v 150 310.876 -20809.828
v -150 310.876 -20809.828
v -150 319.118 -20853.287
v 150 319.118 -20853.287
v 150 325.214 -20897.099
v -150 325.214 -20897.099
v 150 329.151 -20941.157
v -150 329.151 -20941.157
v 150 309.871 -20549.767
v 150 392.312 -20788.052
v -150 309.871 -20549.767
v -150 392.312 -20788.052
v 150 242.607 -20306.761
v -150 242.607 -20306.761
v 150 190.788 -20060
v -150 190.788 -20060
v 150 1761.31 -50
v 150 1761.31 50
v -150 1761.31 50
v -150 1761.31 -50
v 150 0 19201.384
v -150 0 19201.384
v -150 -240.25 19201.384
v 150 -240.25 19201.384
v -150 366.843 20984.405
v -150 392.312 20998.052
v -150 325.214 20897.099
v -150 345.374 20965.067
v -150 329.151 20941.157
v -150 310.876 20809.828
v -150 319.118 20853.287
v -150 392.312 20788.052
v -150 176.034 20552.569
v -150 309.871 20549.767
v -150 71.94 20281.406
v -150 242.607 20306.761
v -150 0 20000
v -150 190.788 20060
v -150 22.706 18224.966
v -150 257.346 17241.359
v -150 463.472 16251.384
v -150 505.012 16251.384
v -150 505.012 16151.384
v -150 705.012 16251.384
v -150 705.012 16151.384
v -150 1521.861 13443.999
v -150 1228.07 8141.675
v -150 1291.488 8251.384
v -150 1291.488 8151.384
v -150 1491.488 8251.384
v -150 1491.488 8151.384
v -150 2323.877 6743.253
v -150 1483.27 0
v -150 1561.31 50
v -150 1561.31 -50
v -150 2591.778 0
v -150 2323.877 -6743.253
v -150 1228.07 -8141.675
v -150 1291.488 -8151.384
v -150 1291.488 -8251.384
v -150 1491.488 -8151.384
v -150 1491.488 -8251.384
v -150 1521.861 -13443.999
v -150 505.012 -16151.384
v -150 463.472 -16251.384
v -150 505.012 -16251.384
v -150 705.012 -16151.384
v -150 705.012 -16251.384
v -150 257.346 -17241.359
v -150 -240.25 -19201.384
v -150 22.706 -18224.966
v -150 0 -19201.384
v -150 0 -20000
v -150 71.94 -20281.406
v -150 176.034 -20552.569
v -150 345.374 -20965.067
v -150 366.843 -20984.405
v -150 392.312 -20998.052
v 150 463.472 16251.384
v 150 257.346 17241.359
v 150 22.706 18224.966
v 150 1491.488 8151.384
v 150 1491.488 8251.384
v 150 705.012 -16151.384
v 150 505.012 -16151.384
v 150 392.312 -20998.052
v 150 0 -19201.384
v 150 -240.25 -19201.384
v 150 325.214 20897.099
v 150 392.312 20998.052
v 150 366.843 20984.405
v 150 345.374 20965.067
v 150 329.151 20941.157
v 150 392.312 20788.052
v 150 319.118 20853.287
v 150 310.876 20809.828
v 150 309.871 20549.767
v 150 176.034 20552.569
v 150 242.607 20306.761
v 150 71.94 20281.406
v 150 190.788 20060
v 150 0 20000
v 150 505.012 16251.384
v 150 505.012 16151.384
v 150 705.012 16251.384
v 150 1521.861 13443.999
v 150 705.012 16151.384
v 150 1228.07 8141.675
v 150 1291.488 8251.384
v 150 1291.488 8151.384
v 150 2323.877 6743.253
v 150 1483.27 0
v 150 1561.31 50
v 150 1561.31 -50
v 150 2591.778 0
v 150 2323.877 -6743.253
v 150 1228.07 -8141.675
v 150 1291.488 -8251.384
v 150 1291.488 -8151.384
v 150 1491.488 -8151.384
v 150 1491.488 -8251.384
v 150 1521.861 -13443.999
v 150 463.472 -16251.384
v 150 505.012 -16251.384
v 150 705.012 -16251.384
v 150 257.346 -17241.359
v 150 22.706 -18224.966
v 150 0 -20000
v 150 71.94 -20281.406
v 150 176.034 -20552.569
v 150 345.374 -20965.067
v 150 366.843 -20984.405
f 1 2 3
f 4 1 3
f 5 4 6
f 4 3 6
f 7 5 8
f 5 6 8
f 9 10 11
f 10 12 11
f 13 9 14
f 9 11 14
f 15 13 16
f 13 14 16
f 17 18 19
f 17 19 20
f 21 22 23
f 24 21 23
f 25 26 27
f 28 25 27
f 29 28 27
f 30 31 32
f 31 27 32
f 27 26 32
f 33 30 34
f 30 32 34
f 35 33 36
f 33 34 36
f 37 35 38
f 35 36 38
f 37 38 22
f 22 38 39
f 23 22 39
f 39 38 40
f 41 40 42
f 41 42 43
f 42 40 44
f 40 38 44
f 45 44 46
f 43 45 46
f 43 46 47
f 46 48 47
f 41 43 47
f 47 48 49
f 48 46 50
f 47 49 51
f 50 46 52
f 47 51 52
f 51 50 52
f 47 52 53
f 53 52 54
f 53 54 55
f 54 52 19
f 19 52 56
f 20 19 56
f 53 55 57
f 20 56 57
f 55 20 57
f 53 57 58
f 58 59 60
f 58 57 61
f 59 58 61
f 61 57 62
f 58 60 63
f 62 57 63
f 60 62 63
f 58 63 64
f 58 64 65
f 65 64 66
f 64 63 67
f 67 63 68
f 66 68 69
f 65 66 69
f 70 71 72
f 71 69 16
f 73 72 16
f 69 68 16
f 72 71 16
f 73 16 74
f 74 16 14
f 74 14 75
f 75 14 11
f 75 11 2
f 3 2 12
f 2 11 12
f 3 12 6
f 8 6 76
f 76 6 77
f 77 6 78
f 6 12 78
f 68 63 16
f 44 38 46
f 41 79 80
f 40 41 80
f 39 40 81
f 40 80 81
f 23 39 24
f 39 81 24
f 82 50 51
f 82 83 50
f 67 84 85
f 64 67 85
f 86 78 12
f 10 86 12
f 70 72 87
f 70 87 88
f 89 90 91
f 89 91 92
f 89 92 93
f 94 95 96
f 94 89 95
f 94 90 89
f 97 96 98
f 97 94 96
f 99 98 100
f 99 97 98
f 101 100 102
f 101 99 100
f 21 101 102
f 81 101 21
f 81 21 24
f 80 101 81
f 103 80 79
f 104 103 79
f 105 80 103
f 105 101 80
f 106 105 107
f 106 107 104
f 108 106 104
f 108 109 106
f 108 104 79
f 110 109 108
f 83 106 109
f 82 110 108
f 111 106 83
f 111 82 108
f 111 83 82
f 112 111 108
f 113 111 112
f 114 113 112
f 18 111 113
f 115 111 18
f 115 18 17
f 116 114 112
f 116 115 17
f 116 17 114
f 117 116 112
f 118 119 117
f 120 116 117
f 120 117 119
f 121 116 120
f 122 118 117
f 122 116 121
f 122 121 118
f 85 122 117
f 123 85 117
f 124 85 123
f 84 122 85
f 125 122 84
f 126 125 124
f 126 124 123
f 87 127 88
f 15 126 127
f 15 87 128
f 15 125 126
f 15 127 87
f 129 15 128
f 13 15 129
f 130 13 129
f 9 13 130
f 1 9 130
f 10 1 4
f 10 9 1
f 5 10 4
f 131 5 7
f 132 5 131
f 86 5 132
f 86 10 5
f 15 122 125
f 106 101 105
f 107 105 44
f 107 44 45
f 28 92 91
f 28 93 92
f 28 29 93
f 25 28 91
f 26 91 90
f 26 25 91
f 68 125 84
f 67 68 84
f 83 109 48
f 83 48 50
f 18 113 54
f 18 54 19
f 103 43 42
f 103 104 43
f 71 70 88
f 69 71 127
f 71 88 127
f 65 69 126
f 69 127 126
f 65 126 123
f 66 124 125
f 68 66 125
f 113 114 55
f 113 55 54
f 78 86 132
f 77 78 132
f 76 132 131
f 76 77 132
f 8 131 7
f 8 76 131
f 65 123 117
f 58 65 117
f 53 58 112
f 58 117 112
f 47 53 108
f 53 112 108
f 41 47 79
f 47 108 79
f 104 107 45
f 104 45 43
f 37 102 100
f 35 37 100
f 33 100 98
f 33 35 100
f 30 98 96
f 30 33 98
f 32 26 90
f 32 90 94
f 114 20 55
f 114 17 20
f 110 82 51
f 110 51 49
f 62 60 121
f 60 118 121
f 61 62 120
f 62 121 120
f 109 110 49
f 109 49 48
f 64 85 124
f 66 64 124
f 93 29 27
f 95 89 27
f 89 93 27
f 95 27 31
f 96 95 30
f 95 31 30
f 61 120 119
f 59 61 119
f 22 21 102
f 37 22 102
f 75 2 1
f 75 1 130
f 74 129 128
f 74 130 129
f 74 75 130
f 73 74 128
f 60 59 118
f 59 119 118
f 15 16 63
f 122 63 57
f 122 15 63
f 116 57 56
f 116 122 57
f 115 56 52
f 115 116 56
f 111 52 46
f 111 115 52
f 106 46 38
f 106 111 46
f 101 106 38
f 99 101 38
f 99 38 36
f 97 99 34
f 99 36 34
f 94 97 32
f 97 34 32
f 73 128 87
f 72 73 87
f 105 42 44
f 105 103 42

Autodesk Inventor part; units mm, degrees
ref_plane "YZ Plane" through (0, 0, 0) normal (1, 0, 0) x (0, 1, 0)
ref_plane "XZ Plane" through (0, 0, 0) normal (0, 1, 0) x (-1, 0, 0)
ref_plane "XY Plane" through (0, 0, 0) normal (0, 0, 1) x (1, 0, 0)
sketch "Sketch1" plane through (0, 0, 0) normal (1, 0, 0) x (0, 1, 0)
  arc A0 (0, -20000) -> (0, 20000) centre (-198997.4874, 0) ccw
  arc A1 (310.8763, 20809.8284) -> (0, 20000) centre (2453.9848, 19522.55) ccw
  arc A2 (310.8763, 20809.8284) -> (329.1509, 20941.157) centre (-568.9757, 20999.1973) ccw
  arc A3 (392.3115, 20998.0517) -> (329.1509, 20941.157) centre (435.8393, 20886.2245) ccw
  line L0 (392.3115, 20998.0517) -> (392.3115, 20788.0517)
  line L1 (392.3115, 20998.0517) -> (602.3115, 20998.0517) construction
  arc A4 (392.3115, 20788.0517) -> (190.7878, 20060) centre (4129.3676, 19361.7237) ccw
  arc A5 (0, -20000) -> (310.8763, -20809.8284) centre (2453.9848, -19522.55) ccw
  arc A6 (329.1509, -20941.157) -> (310.8763, -20809.8284) centre (-568.9757, -20999.1973) ccw
  arc A7 (329.1509, -20941.157) -> (392.3115, -20998.0517) centre (435.8393, -20886.2245) ccw
  line L2 (392.3115, -20998.0517) -> (392.3115, -20788.0517)
  line L3 (392.3115, -20998.0517) -> (602.3115, -20998.0517) construction
  arc A8 (190.7878, -20060) -> (392.3115, -20788.0517) centre (4129.3676, -19361.7237) ccw
  arc A9 (190.7878, -20060) -> (190.7878, 20060) centre (-118120.6503, 0) ccw
  line L4 (190.7878, -20060) -> (0, -20000)
  line L5 (190.7878, 20060) -> (0, 20000)
  point P0 (0, 0)
  point P1 (190, -20060)
  dimension "d0" = 200000
  dimension "d1" = 20000
  dimension "d2" = 20000
  dimension "d3" = 0
  dimension "d4" = 0
  dimension "d5" = 2500
  dimension "d6" = 900
  dimension "d7" = 120
  dimension "d8" = 210
  dimension "d9" = 90
  dimension "d10" = 4000
  dimension "d11" = 200
  dimension "d12" = 60
  dimension "d13" = 120000
extrude "Extrusion1" add sketch "Sketch1" along normal blind 150 and the other way blind 150
sketch "Sketch2" plane through (-150, 392.3115, 20998.0517) normal (0, 1, 0) x (1, 0, 0)
  point P0 (150, 20998.0517)
sketch "Sketch4" plane through (-150, 392.3115, 20998.0517) normal (0, 1, 0) x (1, 0, 0)
  point P0 (150, 20998.0517)
sketch "Sketch5" plane through (-150, 392.3115, 20998.0517) normal (0, 1, 0) x (1, 0, 0)
  point P0 (150, 20998.0517)
sketch "Sketch7" plane through (150, 0, 0) normal (1, 0, 0) x (0, 0, -1)
  arc A0 (-20809.8284, 310.8763) -> (-20000, 0) centre (-19522.55, 2453.9848) ccw projected
  arc A1 (20000, 0) -> (20809.8284, 310.8763) centre (19522.55, 2453.9848) ccw projected
  arc A2 (20000, 0) -> (-20000, 0) centre (0, -198997.4874) ccw projected
  arc A3 (20000, 0) -> (-20000, 0) centre (0, -198997.4874) ccw
  line L0 (20000, 0) -> (-20000, 0)
  point P0 (0, 0)
extrude "Extrusion2" add sketch "Sketch7" against normal blind 300
sketch "Sketch8" plane through (150, 0, 0) normal (1, 0, 0) x (0, 0, -1)
  line L0 (0, 0) -> (0, 300)
  line L1 (0, 300) -> (17500, 300)
  line L2 (0, 300) -> (-17500, 300)
  line L3 (0, 300) -> (17500, 300) construction
  arc A0 (17500, 300) -> (-17500, 300) centre (0, -128516.7303) ccw
  dimension "d22" = 300
  dimension "d23" = 17500
  dimension "d24" = 90
  dimension "d25" = 17500
  dimension "d26" = 180
  dimension "d27" = 130000
extrude "Extrusion3" cut sketch "Sketch8" against normal blind 300
sketch "Sketch9" plane through (150, 0, 0) normal (1, 0, 0) x (0, 0, -1)
  line L0 (17500, 300) -> (-17500, 300) projected
  arc A0 (17500, 300) -> (-17500, 300) centre (0, -128516.7303) ccw projected
  line L1 (-17500, 300) -> (-19201.3845, 0)
  line L2 (-20000, 0) -> (20000, 0) projected
  line L3 (-17500, 300) -> (-15772.3689, 300) construction
  line L4 (17500, 300) -> (19201.3845, 0)
  line L5 (17500, 300) -> (19227.6311, 300) construction
  line L6 (19201.3845, 0) -> (-19201.3845, 0)
  point P0 (0, 0)
  dimension "d30" = 170
  dimension "d31" = 10
extrude "Extrusion4" cut sketch "Sketch9" against normal blind 1000 contours L4 L2 L1 L0
sketch "Sketch10" plane through (150, 0, 0) normal (1, 0, 0) x (0, 0, -1)
  point P0 (0, 0)
sketch "Sketch11" plane through (150, 0, 0) normal (1, 0, 0) x (0, 0, -1)
  line L0 (0, 3000) -> (0, -4000)
  line L1 (-19201.3845, 0) -> (-17500, 300) projected
  line L2 (-19201.3845, 0) -> (-19201.3845, -1114.404)
  line L3 (-19201.3845, 0) -> (-18086.9805, 0) construction
  line L4 (-19201.3845, -1114.404) -> (-19201.3845, 1064.8721)
  arc A0 (19937.196, 170.9801) -> (-19937.196, 170.9801) centre (0, -118120.6503) ccw projected
  line L5 (-19201.3845, -239.6685) -> (-16201.3845, -239.6685)
  line L6 (-16201.3845, -239.6685) -> (-16201.3845, -3239.6685)
  line L7 (-16201.3845, -3239.6685) -> (-16201.3845, 2760.3315)
  line L8 (-16201.3845, -239.6685) -> (-8201.3845, -239.6685)
  line L9 (-8201.3845, -239.6685) -> (-8201.3845, -3239.6685)
  line L10 (-8201.3845, -3239.6685) -> (-8201.3845, 2760.3315)
  arc A1 (17500, 300) -> (-17500, 300) centre (0, -128516.7303) ccw projected
  line L11 (-19201.3845, 292.6447) -> (-19201.3845, 0)
  line L12 (-16201.3845, 740.2631) -> (-16201.3845, 469.7618)
  line L13 (-8201.3845, 1558.6666) -> (-8201.3845, 1224.3091)
  line L14 (0, 1839.3497) -> (0, 1483.2697)
  line L15 (-16251.3845, 705.0124) -> (-16151.3845, 705.0124)
  line L16 (-16151.3845, 705.0124) -> (-16151.3845, 505.0124)
  line L17 (-16151.3845, 505.0124) -> (-16251.3845, 505.0124)
  line L18 (-16251.3845, 505.0124) -> (-16251.3845, 705.0124)
  line L19 (-16251.3845, 705.0124) -> (-16151.3845, 505.0124) construction
  line L20 (-16151.3845, 705.0124) -> (-16251.3845, 505.0124) construction
  line L21 (-8251.3845, 1491.4878) -> (-8151.3845, 1491.4878)
  line L22 (-8151.3845, 1491.4878) -> (-8151.3845, 1291.4878)
  line L23 (-8151.3845, 1291.4878) -> (-8251.3845, 1291.4878)
  line L24 (-8251.3845, 1291.4878) -> (-8251.3845, 1491.4878)
  line L25 (-8251.3845, 1491.4878) -> (-8151.3845, 1291.4878) construction
  line L26 (-8151.3845, 1491.4878) -> (-8251.3845, 1291.4878) construction
  line L27 (-50, 1761.3097) -> (50, 1761.3097)
  line L28 (50, 1761.3097) -> (50, 1561.3097)
  line L29 (50, 1561.3097) -> (-50, 1561.3097)
  line L30 (-50, 1561.3097) -> (-50, 1761.3097)
  line L31 (-50, 1761.3097) -> (50, 1561.3097) construction
  line L32 (50, 1761.3097) -> (-50, 1561.3097) construction
  line L33 (19201.3845, 0) -> (17500, 300)
  line L34 (19201.3845, 0) -> (19201.3845, -1114.404)
  line L35 (19201.3845, 0) -> (18086.9805, 0) construction
  line L36 (19201.3845, -1114.404) -> (19201.3845, 1064.8721)
  line L37 (19201.3845, -239.6685) -> (16201.3845, -239.6685)
  line L38 (16201.3845, -239.6685) -> (16201.3845, -3239.6685)
  line L39 (16201.3845, -3239.6685) -> (16201.3845, 2760.3315)
  line L40 (16201.3845, -239.6685) -> (8201.3845, -239.6685)
  line L41 (8201.3845, -239.6685) -> (8201.3845, -3239.6685)
  line L42 (8201.3845, -3239.6685) -> (8201.3845, 2760.3315)
  line L43 (19201.3845, 292.6447) -> (19201.3845, 0)
  line L44 (16201.3845, 740.2631) -> (16201.3845, 469.7618)
  line L45 (8201.3845, 1558.6666) -> (8201.3845, 1224.3091)
  line L46 (16251.3845, 705.0124) -> (16151.3845, 705.0124)
  line L47 (16151.3845, 705.0124) -> (16151.3845, 505.0124)
  line L48 (16151.3845, 505.0124) -> (16251.3845, 505.0124)
  line L49 (16251.3845, 505.0124) -> (16251.3845, 705.0124)
  line L50 (16251.3845, 705.0124) -> (16151.3845, 505.0124) construction
  line L51 (16151.3845, 705.0124) -> (16251.3845, 505.0124) construction
  line L52 (8251.3845, 1491.4878) -> (8151.3845, 1491.4878)
  line L53 (8151.3845, 1491.4878) -> (8151.3845, 1291.4878)
  line L54 (8151.3845, 1291.4878) -> (8251.3845, 1291.4878)
  line L55 (8251.3845, 1291.4878) -> (8251.3845, 1491.4878)
  line L56 (8251.3845, 1491.4878) -> (8151.3845, 1291.4878) construction
  line L57 (8151.3845, 1491.4878) -> (8251.3845, 1291.4878) construction
  point P0 (0, 0)
  point P1 (-16201.3845, 605.0124)
  point P2 (-8201.3845, 1391.4878)
  point P3 (0, 1661.3097)
  point P4 (16201.3845, 605.0124)
  point P5 (8201.3845, 1391.4878)
  dimension "d34" = 7000
  dimension "d35" = 90
  dimension "d36" = 3000
  dimension "d37" = 3000
  dimension "d38" = 6000
  dimension "d39" = 8000
  dimension "d40" = 3000
  dimension "d41" = 6000
  dimension "d42" = 100
  dimension "d43" = 200
  dimension "d44" = 100
  dimension "d45" = 200
  dimension "d46" = 100
  dimension "d47" = 200
extrude "Extrusion5" cut sketch "Sketch11" against normal blind 300 contours L27 L28 L29 L0 | L0 L29 L30 L27 | L52 L55 L54 L42 | L42 L54 L53 L52 | L21 L22 L23 L10 | L10 L23 L24 L21 | L46 L49 L48 L39 | L39 L48 L47 L46 | L15 L16 L17 L7 | L7 L17 L18 L15
sketch "Sketch12" plane through (150, 0, 0) normal (1, 0, 0) x (0, 0, -1)
  line L0 (-19201.3845, 0) -> (-17500, 300) projected
  line L1 (-19201.3845, 0) -> (-19201.3845, -240.2498)
  line L2 (0, 0) -> (0, 2792.8341)
  arc A0 (17500, 300) -> (-17500, 300) centre (0, -128516.7303) ccw projected
  line L3 (-16251.3845, 505.0124) -> (-16251.3845, 705.0124) projected
  line L4 (-16251.3845, 505.0124) -> (-16251.3845, 442.2919)
  line L5 (19201.3845, 0) -> (17500, 300) projected
  line L6 (19201.3845, 0) -> (19201.3845, -240.2498)
  arc A1 (-16251.3845, 463.4717) -> (-19201.3845, -240.2498) centre (-9612.6521, -33901.1501) ccw
  arc A2 (19201.3845, -240.2498) -> (16251.3845, 463.4717) centre (9612.6521, -33901.1501) ccw
  point P0 (19201.3845, -240.2498)
  point P1 (16251.3845, 463.4717)
  point P2 (-19201.3845, -240.2498)
  dimension "d53" = 35000
extrude "Extrusion7" add sketch "Sketch12" against normal blind 300
sketch "Sketch13" plane through (150, 0, 0) normal (1, 0, 0) x (0, 0, -1)
  arc A0 (20060, 190.7878) -> (-20060, 190.7878) centre (0, -118120.6503) ccw projected
  arc A1 (20060, 190.7878) -> (20788.0517, 392.3115) centre (19361.7237, 4129.3676) ccw projected
  arc A2 (20060, 190.7878) -> (-20060, 190.7878) centre (0, -82408.2218) ccw
  point P0 (0, 0)
  point P1 (20060, 190.7878)
  dimension "d56" = 85000
extrude "Extrusion8" add sketch "Sketch13" against normal blind 300
properties material "Wood (Birch)"
